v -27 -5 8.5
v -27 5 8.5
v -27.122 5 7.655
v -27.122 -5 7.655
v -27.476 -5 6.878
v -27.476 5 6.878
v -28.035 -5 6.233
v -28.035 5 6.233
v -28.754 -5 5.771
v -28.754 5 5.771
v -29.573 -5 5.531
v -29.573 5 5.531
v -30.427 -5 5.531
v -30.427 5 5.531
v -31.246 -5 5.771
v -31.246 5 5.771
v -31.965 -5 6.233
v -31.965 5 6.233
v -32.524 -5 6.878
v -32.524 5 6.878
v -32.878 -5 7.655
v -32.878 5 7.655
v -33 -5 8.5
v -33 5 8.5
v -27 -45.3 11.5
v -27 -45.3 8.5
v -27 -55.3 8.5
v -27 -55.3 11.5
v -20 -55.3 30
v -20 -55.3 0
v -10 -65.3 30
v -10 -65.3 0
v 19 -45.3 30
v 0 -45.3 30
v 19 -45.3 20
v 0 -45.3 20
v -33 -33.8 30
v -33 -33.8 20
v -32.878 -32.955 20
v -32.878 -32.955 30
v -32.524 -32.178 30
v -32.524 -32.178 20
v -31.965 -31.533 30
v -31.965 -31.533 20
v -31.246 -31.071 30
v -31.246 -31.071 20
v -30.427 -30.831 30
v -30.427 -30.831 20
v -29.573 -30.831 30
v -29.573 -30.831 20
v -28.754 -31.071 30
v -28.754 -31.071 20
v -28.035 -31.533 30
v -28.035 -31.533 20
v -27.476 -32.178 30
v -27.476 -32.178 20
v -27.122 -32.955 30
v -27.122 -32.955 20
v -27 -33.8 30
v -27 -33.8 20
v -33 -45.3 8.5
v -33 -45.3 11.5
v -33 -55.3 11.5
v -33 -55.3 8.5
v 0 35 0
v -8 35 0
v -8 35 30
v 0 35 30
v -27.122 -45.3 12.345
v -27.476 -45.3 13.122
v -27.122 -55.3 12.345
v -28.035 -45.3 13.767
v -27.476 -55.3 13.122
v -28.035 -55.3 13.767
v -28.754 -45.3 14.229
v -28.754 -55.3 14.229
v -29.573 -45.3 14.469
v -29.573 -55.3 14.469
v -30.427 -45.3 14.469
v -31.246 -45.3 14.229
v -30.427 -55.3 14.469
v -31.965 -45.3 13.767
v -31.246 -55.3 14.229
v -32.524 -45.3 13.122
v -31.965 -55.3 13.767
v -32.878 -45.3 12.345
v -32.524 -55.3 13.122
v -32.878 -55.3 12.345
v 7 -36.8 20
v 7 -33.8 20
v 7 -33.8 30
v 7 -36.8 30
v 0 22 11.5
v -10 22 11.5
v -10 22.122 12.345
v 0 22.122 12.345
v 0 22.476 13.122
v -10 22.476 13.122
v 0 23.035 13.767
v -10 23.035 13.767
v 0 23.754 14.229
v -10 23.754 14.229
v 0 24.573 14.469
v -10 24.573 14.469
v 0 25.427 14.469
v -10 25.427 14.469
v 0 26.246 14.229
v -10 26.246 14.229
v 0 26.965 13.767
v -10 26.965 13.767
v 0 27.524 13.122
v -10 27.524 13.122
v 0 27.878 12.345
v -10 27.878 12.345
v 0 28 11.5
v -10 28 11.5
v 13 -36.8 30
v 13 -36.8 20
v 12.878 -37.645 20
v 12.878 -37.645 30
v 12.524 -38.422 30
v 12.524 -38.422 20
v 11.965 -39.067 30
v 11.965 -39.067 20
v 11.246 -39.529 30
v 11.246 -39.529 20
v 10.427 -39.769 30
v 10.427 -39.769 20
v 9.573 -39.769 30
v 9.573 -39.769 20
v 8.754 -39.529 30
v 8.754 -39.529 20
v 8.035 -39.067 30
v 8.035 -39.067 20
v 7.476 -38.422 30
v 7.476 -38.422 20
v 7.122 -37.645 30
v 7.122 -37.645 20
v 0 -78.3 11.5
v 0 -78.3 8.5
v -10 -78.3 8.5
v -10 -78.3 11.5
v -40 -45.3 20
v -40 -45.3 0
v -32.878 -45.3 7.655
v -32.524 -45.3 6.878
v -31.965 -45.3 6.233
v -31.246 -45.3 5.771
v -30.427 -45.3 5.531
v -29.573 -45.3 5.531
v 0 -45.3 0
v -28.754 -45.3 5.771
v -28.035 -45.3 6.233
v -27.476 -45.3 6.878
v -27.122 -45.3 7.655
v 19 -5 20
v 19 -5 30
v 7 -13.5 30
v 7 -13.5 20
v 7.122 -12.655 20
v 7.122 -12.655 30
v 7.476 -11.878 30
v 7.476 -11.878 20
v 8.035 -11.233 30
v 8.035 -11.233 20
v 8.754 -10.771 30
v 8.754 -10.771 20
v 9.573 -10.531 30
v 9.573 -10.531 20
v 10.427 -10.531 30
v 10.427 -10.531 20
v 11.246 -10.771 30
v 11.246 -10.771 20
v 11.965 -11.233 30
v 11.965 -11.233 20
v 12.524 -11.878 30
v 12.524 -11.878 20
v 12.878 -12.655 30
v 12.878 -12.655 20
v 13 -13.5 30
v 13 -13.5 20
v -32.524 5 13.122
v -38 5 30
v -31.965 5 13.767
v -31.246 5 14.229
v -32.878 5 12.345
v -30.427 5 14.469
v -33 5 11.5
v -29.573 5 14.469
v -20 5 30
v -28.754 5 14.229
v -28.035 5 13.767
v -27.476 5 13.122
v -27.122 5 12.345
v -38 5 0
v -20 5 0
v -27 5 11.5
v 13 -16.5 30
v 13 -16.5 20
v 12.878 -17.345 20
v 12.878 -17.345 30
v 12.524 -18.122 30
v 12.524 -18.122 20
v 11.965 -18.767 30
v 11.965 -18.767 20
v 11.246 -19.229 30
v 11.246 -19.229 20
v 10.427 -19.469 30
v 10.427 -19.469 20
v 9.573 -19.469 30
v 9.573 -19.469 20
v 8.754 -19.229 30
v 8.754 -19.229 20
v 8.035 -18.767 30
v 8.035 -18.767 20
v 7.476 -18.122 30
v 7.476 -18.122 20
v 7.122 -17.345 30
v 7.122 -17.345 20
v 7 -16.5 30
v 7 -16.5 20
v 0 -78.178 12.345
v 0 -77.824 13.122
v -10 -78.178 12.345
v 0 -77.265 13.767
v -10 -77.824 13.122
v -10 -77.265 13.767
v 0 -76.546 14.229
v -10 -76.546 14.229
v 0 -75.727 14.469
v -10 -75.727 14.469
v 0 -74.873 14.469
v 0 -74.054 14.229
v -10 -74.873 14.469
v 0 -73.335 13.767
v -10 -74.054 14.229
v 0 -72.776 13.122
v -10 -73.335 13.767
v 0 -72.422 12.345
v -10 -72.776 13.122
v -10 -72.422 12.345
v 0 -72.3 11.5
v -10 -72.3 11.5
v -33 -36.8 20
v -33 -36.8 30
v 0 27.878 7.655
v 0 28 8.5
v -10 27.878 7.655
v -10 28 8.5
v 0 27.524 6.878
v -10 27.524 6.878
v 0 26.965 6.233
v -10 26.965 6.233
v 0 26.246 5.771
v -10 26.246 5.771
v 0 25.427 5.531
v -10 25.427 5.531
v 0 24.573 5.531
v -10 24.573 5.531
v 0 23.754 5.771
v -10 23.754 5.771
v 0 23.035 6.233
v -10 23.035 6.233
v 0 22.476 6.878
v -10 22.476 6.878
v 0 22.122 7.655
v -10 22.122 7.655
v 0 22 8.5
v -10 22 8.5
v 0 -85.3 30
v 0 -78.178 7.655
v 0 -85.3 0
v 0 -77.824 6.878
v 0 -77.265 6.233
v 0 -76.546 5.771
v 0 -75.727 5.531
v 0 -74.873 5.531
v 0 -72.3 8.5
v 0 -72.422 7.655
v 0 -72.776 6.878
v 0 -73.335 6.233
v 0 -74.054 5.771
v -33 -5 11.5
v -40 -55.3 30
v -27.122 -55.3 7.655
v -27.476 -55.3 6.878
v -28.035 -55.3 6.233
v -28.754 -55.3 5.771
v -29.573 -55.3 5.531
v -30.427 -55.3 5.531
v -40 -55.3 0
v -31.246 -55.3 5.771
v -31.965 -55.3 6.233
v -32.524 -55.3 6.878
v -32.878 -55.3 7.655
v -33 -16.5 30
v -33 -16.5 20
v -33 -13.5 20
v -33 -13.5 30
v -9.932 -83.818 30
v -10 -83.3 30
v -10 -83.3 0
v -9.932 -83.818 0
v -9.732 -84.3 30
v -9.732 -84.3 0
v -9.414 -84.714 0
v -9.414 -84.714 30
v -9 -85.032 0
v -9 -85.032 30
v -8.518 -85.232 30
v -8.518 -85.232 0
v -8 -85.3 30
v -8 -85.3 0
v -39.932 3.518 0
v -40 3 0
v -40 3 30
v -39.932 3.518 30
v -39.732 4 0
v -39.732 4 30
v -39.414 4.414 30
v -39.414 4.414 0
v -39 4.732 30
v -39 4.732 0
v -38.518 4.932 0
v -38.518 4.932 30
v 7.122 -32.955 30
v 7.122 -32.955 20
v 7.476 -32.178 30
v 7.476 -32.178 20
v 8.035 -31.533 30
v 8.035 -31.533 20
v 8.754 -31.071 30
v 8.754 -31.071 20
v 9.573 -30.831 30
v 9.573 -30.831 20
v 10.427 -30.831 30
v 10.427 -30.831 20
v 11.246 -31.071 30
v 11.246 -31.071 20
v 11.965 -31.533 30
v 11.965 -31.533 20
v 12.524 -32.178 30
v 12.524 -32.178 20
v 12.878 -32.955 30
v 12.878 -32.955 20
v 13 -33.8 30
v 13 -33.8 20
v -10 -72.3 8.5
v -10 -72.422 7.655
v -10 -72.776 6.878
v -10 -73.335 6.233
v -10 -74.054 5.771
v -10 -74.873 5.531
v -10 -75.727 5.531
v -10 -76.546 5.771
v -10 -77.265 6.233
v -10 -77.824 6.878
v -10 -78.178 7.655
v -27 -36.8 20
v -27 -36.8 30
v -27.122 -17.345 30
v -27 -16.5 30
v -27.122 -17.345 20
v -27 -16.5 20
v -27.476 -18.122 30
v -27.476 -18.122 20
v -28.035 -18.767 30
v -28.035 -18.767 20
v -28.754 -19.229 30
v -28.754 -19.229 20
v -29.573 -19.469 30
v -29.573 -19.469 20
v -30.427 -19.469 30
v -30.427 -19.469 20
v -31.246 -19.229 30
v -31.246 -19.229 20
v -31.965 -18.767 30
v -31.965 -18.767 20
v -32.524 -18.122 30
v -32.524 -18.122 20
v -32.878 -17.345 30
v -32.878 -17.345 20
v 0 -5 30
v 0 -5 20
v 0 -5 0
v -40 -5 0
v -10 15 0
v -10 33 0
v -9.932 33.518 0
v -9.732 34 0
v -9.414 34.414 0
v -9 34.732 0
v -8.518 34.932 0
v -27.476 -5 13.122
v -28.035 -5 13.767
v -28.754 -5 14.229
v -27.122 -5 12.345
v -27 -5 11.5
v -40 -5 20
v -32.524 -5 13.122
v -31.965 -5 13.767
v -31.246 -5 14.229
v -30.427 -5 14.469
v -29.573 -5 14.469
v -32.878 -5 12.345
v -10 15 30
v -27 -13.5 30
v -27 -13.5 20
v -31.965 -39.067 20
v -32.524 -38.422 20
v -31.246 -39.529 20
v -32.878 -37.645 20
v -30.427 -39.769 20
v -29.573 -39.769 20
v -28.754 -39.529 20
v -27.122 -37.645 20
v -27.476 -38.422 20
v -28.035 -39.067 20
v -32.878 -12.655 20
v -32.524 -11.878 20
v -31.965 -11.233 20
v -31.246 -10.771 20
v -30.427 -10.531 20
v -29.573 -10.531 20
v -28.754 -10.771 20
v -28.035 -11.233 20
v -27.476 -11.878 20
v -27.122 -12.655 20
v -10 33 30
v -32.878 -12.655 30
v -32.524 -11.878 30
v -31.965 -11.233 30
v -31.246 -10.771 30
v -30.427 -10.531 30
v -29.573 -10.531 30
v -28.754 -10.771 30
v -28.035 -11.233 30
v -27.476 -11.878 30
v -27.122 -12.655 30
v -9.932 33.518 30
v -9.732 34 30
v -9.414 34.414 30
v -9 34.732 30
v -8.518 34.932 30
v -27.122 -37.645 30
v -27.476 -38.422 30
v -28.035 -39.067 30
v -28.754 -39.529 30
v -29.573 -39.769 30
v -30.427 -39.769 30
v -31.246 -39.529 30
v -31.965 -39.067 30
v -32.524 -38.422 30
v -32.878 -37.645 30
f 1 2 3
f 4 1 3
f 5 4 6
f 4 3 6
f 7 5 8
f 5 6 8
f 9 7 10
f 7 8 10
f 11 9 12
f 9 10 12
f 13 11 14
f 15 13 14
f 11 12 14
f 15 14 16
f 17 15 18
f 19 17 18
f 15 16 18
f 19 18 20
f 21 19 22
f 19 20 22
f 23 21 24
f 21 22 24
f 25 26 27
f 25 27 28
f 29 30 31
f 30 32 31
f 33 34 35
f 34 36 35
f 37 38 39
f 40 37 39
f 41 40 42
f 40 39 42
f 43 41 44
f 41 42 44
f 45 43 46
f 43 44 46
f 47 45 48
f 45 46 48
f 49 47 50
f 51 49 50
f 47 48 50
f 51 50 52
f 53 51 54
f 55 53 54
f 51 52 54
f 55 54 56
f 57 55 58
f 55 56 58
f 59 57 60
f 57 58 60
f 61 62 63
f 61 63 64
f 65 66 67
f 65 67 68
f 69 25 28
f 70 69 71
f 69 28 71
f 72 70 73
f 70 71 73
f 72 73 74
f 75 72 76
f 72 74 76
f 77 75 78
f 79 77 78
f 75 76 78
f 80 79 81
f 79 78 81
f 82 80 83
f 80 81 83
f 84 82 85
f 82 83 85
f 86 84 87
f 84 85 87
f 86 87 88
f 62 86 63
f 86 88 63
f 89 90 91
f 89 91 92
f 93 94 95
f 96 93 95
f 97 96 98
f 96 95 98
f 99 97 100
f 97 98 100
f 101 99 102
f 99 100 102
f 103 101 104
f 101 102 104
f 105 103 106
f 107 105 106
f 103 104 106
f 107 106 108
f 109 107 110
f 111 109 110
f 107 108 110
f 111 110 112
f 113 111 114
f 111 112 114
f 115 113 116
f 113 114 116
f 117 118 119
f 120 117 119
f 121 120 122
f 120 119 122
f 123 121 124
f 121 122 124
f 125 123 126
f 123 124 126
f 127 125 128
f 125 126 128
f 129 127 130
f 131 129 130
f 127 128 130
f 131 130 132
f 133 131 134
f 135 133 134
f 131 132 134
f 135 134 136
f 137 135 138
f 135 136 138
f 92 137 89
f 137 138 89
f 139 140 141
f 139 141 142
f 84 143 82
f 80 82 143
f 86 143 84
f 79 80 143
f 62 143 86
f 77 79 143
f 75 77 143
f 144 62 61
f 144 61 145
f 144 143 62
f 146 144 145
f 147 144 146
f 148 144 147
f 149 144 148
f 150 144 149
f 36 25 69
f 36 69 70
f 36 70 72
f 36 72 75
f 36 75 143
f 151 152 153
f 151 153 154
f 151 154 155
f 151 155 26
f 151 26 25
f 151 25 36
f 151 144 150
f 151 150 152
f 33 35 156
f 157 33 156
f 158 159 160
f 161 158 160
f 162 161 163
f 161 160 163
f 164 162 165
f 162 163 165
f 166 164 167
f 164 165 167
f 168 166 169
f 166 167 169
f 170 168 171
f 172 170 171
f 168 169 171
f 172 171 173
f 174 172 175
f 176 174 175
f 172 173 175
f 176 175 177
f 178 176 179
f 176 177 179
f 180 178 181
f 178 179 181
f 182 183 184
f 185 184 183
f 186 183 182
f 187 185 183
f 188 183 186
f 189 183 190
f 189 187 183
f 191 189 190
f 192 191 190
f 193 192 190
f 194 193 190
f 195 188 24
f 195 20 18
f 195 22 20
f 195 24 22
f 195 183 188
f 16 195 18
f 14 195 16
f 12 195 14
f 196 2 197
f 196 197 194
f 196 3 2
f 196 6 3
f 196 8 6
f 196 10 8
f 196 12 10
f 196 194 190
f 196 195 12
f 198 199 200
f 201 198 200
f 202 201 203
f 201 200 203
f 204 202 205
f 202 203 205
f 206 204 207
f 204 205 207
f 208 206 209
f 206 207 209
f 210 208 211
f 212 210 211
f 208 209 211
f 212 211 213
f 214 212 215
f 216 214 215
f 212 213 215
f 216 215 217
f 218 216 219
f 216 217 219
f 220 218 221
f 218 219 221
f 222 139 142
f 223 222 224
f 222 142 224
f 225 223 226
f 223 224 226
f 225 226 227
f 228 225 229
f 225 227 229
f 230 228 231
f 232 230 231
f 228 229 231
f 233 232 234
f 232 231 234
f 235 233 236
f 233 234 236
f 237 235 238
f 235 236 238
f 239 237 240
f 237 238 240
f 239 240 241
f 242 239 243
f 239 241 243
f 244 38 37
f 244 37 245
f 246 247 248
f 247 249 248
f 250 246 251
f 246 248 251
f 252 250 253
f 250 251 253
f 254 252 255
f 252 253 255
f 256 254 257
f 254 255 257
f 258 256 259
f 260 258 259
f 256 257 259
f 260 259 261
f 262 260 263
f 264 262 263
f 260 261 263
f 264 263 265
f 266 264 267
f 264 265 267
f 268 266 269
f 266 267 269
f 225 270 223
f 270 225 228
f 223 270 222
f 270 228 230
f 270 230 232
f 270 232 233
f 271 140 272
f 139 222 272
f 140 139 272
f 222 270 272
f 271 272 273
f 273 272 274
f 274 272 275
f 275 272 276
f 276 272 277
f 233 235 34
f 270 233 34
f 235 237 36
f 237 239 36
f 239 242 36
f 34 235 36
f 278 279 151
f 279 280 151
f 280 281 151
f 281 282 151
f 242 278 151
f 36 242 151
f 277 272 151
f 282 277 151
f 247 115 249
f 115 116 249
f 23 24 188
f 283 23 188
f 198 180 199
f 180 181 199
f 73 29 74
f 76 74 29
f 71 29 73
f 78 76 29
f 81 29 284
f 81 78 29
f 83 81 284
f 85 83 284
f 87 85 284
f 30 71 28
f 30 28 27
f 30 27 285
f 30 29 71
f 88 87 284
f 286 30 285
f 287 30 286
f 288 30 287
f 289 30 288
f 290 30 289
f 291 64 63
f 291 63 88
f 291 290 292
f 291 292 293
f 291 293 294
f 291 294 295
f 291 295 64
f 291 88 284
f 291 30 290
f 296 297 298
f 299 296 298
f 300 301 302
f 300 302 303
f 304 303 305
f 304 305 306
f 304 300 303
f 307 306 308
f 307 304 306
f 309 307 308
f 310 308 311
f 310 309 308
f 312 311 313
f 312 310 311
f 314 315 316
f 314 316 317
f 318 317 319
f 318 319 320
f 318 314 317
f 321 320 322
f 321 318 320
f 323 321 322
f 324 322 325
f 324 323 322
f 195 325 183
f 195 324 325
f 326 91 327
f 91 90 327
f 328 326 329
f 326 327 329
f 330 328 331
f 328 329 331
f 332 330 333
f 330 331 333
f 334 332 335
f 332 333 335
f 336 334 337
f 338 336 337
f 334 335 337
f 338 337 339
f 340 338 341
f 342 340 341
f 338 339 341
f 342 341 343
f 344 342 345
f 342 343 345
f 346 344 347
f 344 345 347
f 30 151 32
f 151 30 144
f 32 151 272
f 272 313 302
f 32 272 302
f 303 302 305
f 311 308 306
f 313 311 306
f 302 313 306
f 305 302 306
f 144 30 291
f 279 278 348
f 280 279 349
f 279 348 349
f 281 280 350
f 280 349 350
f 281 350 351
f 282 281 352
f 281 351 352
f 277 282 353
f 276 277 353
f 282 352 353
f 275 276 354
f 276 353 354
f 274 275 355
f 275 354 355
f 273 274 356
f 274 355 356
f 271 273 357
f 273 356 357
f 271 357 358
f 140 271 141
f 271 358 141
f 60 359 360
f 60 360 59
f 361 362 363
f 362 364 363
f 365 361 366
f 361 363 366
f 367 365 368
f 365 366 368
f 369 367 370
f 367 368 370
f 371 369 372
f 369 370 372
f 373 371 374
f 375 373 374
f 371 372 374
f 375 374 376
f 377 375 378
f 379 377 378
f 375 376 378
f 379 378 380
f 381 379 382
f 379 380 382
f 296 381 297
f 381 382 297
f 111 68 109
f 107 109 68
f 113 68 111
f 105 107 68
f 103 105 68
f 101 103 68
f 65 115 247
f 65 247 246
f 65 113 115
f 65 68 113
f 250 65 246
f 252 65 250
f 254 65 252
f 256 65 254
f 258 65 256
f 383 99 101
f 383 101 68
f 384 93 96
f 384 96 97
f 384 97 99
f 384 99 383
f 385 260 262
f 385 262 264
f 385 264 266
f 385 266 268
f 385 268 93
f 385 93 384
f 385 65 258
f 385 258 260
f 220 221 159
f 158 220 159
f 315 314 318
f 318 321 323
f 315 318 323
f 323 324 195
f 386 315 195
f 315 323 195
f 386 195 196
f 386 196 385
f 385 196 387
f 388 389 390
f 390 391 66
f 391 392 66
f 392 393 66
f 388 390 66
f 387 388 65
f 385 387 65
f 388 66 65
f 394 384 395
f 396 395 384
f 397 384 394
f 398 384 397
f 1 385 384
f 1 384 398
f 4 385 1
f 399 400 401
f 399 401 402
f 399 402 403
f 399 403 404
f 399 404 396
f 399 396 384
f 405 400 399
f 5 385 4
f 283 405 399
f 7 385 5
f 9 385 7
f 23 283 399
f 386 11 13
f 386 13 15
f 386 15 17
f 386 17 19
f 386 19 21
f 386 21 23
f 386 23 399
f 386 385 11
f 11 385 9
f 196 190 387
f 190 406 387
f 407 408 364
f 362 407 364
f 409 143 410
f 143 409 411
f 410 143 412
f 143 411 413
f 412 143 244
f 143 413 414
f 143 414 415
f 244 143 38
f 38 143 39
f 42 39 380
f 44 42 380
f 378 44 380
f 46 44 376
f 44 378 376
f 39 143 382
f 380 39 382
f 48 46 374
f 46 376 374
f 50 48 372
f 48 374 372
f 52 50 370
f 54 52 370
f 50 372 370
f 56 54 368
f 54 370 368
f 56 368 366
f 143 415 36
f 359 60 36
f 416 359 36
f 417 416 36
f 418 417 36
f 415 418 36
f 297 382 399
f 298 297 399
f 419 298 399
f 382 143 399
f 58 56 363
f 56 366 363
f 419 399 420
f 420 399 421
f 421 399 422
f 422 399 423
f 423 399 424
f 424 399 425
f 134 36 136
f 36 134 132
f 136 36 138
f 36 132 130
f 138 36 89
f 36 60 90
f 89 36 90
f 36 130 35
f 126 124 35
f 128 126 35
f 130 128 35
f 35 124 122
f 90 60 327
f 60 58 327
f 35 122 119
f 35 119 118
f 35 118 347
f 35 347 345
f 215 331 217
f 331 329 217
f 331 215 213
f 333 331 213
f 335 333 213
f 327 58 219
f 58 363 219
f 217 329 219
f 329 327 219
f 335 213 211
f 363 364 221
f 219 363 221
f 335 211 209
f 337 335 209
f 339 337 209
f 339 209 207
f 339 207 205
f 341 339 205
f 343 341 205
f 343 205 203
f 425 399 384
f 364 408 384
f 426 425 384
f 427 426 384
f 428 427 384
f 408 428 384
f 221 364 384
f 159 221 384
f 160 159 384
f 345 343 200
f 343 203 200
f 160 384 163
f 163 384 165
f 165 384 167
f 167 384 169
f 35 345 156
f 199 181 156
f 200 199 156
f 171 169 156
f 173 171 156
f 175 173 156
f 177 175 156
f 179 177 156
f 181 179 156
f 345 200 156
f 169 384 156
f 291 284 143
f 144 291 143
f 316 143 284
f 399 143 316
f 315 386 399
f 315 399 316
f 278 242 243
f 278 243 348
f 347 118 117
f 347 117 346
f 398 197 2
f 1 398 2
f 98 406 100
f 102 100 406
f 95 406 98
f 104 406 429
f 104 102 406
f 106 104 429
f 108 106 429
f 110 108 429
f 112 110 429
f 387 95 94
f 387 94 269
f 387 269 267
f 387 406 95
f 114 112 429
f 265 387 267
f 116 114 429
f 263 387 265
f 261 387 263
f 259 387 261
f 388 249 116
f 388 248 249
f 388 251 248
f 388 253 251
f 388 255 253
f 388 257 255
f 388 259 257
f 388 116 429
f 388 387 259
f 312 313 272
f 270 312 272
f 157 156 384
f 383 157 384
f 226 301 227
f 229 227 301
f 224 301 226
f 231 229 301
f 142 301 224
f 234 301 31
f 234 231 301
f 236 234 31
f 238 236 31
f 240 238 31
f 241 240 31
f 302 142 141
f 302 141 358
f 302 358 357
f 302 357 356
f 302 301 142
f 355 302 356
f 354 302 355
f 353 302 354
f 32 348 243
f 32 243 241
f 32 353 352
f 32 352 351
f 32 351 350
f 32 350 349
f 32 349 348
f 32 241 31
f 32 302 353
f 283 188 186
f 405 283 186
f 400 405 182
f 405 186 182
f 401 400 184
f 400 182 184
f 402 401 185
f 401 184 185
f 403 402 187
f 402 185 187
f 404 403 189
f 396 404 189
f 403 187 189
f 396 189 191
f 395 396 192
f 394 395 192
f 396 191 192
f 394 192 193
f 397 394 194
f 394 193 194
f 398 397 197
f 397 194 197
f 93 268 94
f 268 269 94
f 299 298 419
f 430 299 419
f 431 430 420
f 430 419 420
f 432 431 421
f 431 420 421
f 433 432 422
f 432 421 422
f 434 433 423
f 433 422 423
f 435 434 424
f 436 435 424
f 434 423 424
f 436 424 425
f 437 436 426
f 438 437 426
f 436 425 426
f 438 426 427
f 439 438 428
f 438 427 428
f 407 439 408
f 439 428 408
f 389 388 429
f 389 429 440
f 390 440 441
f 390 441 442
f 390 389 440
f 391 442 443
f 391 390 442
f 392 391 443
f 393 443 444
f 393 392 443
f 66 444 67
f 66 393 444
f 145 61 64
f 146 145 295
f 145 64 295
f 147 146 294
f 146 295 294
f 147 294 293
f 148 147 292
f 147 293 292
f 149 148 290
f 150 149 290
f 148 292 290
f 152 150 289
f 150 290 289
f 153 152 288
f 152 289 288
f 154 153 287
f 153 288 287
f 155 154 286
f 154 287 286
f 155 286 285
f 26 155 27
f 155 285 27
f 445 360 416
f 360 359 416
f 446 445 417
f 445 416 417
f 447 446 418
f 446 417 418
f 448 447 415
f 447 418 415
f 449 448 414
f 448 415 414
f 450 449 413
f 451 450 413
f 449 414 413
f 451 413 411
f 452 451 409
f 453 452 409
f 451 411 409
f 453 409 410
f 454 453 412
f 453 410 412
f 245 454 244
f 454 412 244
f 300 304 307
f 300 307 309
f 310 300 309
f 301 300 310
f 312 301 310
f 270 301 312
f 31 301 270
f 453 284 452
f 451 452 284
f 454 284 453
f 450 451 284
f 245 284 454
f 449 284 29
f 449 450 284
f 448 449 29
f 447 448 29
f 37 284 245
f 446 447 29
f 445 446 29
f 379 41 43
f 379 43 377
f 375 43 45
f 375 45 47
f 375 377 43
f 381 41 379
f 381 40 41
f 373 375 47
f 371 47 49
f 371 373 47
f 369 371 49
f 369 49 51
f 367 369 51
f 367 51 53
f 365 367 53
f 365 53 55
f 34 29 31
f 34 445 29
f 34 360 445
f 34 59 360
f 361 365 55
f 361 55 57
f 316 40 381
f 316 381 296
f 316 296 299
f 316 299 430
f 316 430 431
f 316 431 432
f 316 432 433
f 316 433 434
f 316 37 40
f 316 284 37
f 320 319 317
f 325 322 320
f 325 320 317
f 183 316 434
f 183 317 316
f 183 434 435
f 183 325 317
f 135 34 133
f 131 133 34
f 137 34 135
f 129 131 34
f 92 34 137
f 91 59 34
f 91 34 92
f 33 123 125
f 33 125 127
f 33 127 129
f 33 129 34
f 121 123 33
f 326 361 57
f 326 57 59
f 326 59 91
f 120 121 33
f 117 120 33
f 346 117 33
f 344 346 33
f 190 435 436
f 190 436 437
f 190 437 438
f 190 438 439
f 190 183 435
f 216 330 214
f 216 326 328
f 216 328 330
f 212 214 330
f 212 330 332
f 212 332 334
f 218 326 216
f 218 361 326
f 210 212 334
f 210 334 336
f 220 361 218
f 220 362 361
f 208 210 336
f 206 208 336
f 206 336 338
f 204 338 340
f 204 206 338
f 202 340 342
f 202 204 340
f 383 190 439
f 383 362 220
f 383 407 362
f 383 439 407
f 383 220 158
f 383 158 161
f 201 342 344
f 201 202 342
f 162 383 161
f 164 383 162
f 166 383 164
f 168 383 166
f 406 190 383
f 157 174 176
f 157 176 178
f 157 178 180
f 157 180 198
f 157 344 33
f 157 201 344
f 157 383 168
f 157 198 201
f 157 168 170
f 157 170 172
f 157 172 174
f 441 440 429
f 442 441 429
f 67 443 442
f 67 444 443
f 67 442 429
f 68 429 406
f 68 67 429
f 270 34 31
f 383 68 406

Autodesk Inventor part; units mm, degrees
ref_plane "YZ Plane" through (0, 0, 0) normal (1, 0, 0) x (0, 1, 0)
ref_plane "XZ Plane" through (0, 0, 0) normal (0, 1, 0) x (-1, 0, 0)
sketch "Sketch1" plane through (0, 0, 0) normal (0, 0, 1) x (1, 0, 0)
  line L0 (-40, 5) -> (0, 5)
  line L1 (0, 5) -> (0, -5)
  line L2 (0, -5) -> (-40, -5)
  line L3 (-40, -5) -> (-40, 5)
  line L4 (-10, 35) -> (0, 35)
  line L5 (0, 35) -> (0, 5)
  line L6 (0, 5) -> (-10, 5)
  line L7 (-10, 5) -> (-10, 35)
  point P0 (0, 0)
  point P1 (0, 5)
  dimension "d0" = 10
  dimension "d1" = 40
  dimension "d2" = 40
extrude "Extrusion1" add sketch "Sketch1" along normal blind 20
sketch "Sketch2" plane through (-10, 5, 0) normal (-1, 0, 0) x (0, 0, 1)
  line L0 (8.5, 20) -> (11.5, 20) construction
  line L1 (8.5, 17) -> (11.5, 17)
  line L2 (11.5, 23) -> (8.5, 23)
  arc A0 (8.5, 23) -> (8.5, 17) centre (8.5, 20) ccw
  arc A1 (11.5, 17) -> (11.5, 23) centre (11.5, 20) ccw
  line L3 (0, 30) -> (0, 0) projected
  line L4 (0, 30) -> (20, 30) projected
  line L5 (10, 21.547) -> (10, 15) construction
  line L6 (11.5, 20) -> (8.5, 20) construction
  line L7 (11.5, 17) -> (8.5, 17)
  line L8 (8.5, 23) -> (11.5, 23)
  arc A2 (11.5, 17) -> (11.5, 23) centre (11.5, 20) ccw
  arc A3 (8.5, 23) -> (8.5, 17) centre (8.5, 20) ccw
  point P0 (0, -5)
  point P1 (10, 20)
  point P2 (10, 18.2735)
  point P3 (10, 30)
  point P4 (10, 20)
  dimension "d5" = 6
  dimension "d6" = 3
  dimension "d7" = 10
  dimension "d8" = 10
extrude "Extrusion2" cut sketch "Sketch2" against normal through all
sketch "Sketch3" plane through (-40, 5, 0) normal (0, 1, 0) x (1, 0, 0)
  line L0 (10, -8.5) -> (10, -11.5) construction
  line L1 (7, -8.5) -> (7, -11.5)
  line L2 (13, -11.5) -> (13, -8.5)
  arc A0 (13, -8.5) -> (7, -8.5) centre (10, -8.5) ccw
  arc A1 (7, -11.5) -> (13, -11.5) centre (10, -11.5) ccw
  line L3 (30, 0) -> (0, 0) projected
  line L4 (0, 0) -> (0, -20) projected
  line L5 (15.2557, -10) -> (9.287, -10) construction
  line L6 (10, -11.5) -> (10, -8.5) construction
  line L7 (7, -11.5) -> (7, -8.5)
  line L8 (13, -8.5) -> (13, -11.5)
  arc A2 (7, -11.5) -> (13, -11.5) centre (10, -11.5) ccw
  arc A3 (13, -8.5) -> (7, -8.5) centre (10, -8.5) ccw
  point P0 (40, 0)
  point P1 (10, -10)
  point P2 (12.2713, -10)
  point P3 (0, -10)
  point P4 (10, -10)
  dimension "d11" = 3
  dimension "d12" = 6
  dimension "d13" = 10
  dimension "d14" = 10
extrude "Extrusion3" cut sketch "Sketch3" against normal through all
chamfer "Chamfer1" distance 10 angle 45 1 edges at (-10, 5, 10)
sketch "Sketch10" plane through (0, 0, 20) normal (0, 0, 1) x (1, 0, 0)
  line L0 (-40, -85.3) -> (0, -85.3)
  line L1 (0, -85.3) -> (0, 35)
  line L2 (0, 35) -> (-40, 35)
  line L3 (-40, 35) -> (-40, -85.3)
  line L4 (-40, 5) -> (-40, -5) projected
  line L5 (0, 35) -> (-10, 35) projected
  line L6 (0, -5) -> (0, 35) projected
  line L7 (-40, -5) -> (0, -5) projected
  line L8 (0, -45.3) -> (19, -45.3)
  line L9 (19, -45.3) -> (19, -5)
  line L10 (19, -5) -> (0, -5)
  line L11 (0, -5) -> (0, -45.3)
  point P0 (0, 0)
  dimension "d30" = 80.3
  dimension "d31" = 120.3
  dimension "d37" = 40.3
  dimension "d38" = 19
extrude "Extrusion7" add sketch "Sketch10" along normal blind 10
ref_plane "Work Plane2" through (-10, -25.15, 0) normal (0, 1, 0) x (1, 0, 0)
mirror "Mirror2" about plane through (-10, -25.15, 0) normal (0, 1, 0) of "Extrusion1", "Extrusion2", "Extrusion3", "Chamfer1"
sketch "Sketch11" plane through (0, 0, 20) normal (0, 0, -1) x (-1, 0, 0)
  line L0 (10, 35) -> (10, 15) projected
  line L1 (20, 5) -> (10, 15) projected
  line L2 (20, 5) -> (40, 5) projected
  line L3 (40, 35) -> (40, 5) projected
  line L4 (10, 35) -> (40, 35) projected
  point P0 (0, 0)
extrude "Extrusion8" cut sketch "Sketch11" against normal through all
mirror "Mirror3" about plane through (-10, -25.15, 0) normal (0, 1, 0) of "Extrusion8"
sketch "Sketch12" plane through (0, 0, 20) normal (0, 0, -1) x (-1, 0, 0)
  line L0 (30, -13.5) -> (30, -16.5) construction
  line L1 (27, -13.5) -> (27, -16.5)
  line L2 (33, -16.5) -> (33, -13.5)
  arc A0 (33, -13.5) -> (27, -13.5) centre (30, -13.5) ccw
  arc A1 (27, -16.5) -> (33, -16.5) centre (30, -16.5) ccw
  line L3 (40, -5) -> (40, -45.3) projected
  line L4 (40, -5) -> (0, -5) projected
  line L5 (-10, -13.5) -> (-10, -16.5) construction
  line L6 (-13, -13.5) -> (-13, -16.5)
  line L7 (-7, -16.5) -> (-7, -13.5)
  arc A2 (-7, -13.5) -> (-13, -13.5) centre (-10, -13.5) ccw
  arc A3 (-13, -16.5) -> (-7, -16.5) centre (-10, -16.5) ccw
  line L8 (-19, -45.3) -> (-19, -5) projected
  line L9 (33, -25.15) -> (24.6871, -25.15) construction
  line L10 (30, -36.8) -> (30, -33.8) construction
  line L11 (27, -36.8) -> (27, -33.8)
  line L12 (33, -33.8) -> (33, -36.8)
  arc A4 (27, -36.8) -> (33, -36.8) centre (30, -36.8) ccw
  arc A5 (33, -33.8) -> (27, -33.8) centre (30, -33.8) ccw
  line L13 (-10, -36.8) -> (-10, -33.8) construction
  line L14 (-13, -36.8) -> (-13, -33.8)
  line L15 (-7, -33.8) -> (-7, -36.8)
  arc A6 (-13, -36.8) -> (-7, -36.8) centre (-10, -36.8) ccw
  arc A7 (-7, -33.8) -> (-13, -33.8) centre (-10, -33.8) ccw
  point P0 (0, 0)
  point P1 (30, -15)
  point P2 (-10, -15)
  point P3 (28.8435, -25.15)
  point P4 (40, -25.15)
  point P5 (30, -35.3)
  point P6 (-10, -35.3)
  dimension "d39" = 3
  dimension "d40" = 10
  dimension "d41" = 10
  dimension "d42" = 6
  dimension "d43" = 9
extrude "Extrusion9" cut sketch "Sketch12" against normal through all
fillet "Fillet2" radius 2 3 edges at (-40, 5, 15) (-10, 35, 15) (-10, -85.3, 15)
equation "\"d2\" = d1"
properties part number "0008-10-031 Suport L + placa" material "ABS Plastic"
